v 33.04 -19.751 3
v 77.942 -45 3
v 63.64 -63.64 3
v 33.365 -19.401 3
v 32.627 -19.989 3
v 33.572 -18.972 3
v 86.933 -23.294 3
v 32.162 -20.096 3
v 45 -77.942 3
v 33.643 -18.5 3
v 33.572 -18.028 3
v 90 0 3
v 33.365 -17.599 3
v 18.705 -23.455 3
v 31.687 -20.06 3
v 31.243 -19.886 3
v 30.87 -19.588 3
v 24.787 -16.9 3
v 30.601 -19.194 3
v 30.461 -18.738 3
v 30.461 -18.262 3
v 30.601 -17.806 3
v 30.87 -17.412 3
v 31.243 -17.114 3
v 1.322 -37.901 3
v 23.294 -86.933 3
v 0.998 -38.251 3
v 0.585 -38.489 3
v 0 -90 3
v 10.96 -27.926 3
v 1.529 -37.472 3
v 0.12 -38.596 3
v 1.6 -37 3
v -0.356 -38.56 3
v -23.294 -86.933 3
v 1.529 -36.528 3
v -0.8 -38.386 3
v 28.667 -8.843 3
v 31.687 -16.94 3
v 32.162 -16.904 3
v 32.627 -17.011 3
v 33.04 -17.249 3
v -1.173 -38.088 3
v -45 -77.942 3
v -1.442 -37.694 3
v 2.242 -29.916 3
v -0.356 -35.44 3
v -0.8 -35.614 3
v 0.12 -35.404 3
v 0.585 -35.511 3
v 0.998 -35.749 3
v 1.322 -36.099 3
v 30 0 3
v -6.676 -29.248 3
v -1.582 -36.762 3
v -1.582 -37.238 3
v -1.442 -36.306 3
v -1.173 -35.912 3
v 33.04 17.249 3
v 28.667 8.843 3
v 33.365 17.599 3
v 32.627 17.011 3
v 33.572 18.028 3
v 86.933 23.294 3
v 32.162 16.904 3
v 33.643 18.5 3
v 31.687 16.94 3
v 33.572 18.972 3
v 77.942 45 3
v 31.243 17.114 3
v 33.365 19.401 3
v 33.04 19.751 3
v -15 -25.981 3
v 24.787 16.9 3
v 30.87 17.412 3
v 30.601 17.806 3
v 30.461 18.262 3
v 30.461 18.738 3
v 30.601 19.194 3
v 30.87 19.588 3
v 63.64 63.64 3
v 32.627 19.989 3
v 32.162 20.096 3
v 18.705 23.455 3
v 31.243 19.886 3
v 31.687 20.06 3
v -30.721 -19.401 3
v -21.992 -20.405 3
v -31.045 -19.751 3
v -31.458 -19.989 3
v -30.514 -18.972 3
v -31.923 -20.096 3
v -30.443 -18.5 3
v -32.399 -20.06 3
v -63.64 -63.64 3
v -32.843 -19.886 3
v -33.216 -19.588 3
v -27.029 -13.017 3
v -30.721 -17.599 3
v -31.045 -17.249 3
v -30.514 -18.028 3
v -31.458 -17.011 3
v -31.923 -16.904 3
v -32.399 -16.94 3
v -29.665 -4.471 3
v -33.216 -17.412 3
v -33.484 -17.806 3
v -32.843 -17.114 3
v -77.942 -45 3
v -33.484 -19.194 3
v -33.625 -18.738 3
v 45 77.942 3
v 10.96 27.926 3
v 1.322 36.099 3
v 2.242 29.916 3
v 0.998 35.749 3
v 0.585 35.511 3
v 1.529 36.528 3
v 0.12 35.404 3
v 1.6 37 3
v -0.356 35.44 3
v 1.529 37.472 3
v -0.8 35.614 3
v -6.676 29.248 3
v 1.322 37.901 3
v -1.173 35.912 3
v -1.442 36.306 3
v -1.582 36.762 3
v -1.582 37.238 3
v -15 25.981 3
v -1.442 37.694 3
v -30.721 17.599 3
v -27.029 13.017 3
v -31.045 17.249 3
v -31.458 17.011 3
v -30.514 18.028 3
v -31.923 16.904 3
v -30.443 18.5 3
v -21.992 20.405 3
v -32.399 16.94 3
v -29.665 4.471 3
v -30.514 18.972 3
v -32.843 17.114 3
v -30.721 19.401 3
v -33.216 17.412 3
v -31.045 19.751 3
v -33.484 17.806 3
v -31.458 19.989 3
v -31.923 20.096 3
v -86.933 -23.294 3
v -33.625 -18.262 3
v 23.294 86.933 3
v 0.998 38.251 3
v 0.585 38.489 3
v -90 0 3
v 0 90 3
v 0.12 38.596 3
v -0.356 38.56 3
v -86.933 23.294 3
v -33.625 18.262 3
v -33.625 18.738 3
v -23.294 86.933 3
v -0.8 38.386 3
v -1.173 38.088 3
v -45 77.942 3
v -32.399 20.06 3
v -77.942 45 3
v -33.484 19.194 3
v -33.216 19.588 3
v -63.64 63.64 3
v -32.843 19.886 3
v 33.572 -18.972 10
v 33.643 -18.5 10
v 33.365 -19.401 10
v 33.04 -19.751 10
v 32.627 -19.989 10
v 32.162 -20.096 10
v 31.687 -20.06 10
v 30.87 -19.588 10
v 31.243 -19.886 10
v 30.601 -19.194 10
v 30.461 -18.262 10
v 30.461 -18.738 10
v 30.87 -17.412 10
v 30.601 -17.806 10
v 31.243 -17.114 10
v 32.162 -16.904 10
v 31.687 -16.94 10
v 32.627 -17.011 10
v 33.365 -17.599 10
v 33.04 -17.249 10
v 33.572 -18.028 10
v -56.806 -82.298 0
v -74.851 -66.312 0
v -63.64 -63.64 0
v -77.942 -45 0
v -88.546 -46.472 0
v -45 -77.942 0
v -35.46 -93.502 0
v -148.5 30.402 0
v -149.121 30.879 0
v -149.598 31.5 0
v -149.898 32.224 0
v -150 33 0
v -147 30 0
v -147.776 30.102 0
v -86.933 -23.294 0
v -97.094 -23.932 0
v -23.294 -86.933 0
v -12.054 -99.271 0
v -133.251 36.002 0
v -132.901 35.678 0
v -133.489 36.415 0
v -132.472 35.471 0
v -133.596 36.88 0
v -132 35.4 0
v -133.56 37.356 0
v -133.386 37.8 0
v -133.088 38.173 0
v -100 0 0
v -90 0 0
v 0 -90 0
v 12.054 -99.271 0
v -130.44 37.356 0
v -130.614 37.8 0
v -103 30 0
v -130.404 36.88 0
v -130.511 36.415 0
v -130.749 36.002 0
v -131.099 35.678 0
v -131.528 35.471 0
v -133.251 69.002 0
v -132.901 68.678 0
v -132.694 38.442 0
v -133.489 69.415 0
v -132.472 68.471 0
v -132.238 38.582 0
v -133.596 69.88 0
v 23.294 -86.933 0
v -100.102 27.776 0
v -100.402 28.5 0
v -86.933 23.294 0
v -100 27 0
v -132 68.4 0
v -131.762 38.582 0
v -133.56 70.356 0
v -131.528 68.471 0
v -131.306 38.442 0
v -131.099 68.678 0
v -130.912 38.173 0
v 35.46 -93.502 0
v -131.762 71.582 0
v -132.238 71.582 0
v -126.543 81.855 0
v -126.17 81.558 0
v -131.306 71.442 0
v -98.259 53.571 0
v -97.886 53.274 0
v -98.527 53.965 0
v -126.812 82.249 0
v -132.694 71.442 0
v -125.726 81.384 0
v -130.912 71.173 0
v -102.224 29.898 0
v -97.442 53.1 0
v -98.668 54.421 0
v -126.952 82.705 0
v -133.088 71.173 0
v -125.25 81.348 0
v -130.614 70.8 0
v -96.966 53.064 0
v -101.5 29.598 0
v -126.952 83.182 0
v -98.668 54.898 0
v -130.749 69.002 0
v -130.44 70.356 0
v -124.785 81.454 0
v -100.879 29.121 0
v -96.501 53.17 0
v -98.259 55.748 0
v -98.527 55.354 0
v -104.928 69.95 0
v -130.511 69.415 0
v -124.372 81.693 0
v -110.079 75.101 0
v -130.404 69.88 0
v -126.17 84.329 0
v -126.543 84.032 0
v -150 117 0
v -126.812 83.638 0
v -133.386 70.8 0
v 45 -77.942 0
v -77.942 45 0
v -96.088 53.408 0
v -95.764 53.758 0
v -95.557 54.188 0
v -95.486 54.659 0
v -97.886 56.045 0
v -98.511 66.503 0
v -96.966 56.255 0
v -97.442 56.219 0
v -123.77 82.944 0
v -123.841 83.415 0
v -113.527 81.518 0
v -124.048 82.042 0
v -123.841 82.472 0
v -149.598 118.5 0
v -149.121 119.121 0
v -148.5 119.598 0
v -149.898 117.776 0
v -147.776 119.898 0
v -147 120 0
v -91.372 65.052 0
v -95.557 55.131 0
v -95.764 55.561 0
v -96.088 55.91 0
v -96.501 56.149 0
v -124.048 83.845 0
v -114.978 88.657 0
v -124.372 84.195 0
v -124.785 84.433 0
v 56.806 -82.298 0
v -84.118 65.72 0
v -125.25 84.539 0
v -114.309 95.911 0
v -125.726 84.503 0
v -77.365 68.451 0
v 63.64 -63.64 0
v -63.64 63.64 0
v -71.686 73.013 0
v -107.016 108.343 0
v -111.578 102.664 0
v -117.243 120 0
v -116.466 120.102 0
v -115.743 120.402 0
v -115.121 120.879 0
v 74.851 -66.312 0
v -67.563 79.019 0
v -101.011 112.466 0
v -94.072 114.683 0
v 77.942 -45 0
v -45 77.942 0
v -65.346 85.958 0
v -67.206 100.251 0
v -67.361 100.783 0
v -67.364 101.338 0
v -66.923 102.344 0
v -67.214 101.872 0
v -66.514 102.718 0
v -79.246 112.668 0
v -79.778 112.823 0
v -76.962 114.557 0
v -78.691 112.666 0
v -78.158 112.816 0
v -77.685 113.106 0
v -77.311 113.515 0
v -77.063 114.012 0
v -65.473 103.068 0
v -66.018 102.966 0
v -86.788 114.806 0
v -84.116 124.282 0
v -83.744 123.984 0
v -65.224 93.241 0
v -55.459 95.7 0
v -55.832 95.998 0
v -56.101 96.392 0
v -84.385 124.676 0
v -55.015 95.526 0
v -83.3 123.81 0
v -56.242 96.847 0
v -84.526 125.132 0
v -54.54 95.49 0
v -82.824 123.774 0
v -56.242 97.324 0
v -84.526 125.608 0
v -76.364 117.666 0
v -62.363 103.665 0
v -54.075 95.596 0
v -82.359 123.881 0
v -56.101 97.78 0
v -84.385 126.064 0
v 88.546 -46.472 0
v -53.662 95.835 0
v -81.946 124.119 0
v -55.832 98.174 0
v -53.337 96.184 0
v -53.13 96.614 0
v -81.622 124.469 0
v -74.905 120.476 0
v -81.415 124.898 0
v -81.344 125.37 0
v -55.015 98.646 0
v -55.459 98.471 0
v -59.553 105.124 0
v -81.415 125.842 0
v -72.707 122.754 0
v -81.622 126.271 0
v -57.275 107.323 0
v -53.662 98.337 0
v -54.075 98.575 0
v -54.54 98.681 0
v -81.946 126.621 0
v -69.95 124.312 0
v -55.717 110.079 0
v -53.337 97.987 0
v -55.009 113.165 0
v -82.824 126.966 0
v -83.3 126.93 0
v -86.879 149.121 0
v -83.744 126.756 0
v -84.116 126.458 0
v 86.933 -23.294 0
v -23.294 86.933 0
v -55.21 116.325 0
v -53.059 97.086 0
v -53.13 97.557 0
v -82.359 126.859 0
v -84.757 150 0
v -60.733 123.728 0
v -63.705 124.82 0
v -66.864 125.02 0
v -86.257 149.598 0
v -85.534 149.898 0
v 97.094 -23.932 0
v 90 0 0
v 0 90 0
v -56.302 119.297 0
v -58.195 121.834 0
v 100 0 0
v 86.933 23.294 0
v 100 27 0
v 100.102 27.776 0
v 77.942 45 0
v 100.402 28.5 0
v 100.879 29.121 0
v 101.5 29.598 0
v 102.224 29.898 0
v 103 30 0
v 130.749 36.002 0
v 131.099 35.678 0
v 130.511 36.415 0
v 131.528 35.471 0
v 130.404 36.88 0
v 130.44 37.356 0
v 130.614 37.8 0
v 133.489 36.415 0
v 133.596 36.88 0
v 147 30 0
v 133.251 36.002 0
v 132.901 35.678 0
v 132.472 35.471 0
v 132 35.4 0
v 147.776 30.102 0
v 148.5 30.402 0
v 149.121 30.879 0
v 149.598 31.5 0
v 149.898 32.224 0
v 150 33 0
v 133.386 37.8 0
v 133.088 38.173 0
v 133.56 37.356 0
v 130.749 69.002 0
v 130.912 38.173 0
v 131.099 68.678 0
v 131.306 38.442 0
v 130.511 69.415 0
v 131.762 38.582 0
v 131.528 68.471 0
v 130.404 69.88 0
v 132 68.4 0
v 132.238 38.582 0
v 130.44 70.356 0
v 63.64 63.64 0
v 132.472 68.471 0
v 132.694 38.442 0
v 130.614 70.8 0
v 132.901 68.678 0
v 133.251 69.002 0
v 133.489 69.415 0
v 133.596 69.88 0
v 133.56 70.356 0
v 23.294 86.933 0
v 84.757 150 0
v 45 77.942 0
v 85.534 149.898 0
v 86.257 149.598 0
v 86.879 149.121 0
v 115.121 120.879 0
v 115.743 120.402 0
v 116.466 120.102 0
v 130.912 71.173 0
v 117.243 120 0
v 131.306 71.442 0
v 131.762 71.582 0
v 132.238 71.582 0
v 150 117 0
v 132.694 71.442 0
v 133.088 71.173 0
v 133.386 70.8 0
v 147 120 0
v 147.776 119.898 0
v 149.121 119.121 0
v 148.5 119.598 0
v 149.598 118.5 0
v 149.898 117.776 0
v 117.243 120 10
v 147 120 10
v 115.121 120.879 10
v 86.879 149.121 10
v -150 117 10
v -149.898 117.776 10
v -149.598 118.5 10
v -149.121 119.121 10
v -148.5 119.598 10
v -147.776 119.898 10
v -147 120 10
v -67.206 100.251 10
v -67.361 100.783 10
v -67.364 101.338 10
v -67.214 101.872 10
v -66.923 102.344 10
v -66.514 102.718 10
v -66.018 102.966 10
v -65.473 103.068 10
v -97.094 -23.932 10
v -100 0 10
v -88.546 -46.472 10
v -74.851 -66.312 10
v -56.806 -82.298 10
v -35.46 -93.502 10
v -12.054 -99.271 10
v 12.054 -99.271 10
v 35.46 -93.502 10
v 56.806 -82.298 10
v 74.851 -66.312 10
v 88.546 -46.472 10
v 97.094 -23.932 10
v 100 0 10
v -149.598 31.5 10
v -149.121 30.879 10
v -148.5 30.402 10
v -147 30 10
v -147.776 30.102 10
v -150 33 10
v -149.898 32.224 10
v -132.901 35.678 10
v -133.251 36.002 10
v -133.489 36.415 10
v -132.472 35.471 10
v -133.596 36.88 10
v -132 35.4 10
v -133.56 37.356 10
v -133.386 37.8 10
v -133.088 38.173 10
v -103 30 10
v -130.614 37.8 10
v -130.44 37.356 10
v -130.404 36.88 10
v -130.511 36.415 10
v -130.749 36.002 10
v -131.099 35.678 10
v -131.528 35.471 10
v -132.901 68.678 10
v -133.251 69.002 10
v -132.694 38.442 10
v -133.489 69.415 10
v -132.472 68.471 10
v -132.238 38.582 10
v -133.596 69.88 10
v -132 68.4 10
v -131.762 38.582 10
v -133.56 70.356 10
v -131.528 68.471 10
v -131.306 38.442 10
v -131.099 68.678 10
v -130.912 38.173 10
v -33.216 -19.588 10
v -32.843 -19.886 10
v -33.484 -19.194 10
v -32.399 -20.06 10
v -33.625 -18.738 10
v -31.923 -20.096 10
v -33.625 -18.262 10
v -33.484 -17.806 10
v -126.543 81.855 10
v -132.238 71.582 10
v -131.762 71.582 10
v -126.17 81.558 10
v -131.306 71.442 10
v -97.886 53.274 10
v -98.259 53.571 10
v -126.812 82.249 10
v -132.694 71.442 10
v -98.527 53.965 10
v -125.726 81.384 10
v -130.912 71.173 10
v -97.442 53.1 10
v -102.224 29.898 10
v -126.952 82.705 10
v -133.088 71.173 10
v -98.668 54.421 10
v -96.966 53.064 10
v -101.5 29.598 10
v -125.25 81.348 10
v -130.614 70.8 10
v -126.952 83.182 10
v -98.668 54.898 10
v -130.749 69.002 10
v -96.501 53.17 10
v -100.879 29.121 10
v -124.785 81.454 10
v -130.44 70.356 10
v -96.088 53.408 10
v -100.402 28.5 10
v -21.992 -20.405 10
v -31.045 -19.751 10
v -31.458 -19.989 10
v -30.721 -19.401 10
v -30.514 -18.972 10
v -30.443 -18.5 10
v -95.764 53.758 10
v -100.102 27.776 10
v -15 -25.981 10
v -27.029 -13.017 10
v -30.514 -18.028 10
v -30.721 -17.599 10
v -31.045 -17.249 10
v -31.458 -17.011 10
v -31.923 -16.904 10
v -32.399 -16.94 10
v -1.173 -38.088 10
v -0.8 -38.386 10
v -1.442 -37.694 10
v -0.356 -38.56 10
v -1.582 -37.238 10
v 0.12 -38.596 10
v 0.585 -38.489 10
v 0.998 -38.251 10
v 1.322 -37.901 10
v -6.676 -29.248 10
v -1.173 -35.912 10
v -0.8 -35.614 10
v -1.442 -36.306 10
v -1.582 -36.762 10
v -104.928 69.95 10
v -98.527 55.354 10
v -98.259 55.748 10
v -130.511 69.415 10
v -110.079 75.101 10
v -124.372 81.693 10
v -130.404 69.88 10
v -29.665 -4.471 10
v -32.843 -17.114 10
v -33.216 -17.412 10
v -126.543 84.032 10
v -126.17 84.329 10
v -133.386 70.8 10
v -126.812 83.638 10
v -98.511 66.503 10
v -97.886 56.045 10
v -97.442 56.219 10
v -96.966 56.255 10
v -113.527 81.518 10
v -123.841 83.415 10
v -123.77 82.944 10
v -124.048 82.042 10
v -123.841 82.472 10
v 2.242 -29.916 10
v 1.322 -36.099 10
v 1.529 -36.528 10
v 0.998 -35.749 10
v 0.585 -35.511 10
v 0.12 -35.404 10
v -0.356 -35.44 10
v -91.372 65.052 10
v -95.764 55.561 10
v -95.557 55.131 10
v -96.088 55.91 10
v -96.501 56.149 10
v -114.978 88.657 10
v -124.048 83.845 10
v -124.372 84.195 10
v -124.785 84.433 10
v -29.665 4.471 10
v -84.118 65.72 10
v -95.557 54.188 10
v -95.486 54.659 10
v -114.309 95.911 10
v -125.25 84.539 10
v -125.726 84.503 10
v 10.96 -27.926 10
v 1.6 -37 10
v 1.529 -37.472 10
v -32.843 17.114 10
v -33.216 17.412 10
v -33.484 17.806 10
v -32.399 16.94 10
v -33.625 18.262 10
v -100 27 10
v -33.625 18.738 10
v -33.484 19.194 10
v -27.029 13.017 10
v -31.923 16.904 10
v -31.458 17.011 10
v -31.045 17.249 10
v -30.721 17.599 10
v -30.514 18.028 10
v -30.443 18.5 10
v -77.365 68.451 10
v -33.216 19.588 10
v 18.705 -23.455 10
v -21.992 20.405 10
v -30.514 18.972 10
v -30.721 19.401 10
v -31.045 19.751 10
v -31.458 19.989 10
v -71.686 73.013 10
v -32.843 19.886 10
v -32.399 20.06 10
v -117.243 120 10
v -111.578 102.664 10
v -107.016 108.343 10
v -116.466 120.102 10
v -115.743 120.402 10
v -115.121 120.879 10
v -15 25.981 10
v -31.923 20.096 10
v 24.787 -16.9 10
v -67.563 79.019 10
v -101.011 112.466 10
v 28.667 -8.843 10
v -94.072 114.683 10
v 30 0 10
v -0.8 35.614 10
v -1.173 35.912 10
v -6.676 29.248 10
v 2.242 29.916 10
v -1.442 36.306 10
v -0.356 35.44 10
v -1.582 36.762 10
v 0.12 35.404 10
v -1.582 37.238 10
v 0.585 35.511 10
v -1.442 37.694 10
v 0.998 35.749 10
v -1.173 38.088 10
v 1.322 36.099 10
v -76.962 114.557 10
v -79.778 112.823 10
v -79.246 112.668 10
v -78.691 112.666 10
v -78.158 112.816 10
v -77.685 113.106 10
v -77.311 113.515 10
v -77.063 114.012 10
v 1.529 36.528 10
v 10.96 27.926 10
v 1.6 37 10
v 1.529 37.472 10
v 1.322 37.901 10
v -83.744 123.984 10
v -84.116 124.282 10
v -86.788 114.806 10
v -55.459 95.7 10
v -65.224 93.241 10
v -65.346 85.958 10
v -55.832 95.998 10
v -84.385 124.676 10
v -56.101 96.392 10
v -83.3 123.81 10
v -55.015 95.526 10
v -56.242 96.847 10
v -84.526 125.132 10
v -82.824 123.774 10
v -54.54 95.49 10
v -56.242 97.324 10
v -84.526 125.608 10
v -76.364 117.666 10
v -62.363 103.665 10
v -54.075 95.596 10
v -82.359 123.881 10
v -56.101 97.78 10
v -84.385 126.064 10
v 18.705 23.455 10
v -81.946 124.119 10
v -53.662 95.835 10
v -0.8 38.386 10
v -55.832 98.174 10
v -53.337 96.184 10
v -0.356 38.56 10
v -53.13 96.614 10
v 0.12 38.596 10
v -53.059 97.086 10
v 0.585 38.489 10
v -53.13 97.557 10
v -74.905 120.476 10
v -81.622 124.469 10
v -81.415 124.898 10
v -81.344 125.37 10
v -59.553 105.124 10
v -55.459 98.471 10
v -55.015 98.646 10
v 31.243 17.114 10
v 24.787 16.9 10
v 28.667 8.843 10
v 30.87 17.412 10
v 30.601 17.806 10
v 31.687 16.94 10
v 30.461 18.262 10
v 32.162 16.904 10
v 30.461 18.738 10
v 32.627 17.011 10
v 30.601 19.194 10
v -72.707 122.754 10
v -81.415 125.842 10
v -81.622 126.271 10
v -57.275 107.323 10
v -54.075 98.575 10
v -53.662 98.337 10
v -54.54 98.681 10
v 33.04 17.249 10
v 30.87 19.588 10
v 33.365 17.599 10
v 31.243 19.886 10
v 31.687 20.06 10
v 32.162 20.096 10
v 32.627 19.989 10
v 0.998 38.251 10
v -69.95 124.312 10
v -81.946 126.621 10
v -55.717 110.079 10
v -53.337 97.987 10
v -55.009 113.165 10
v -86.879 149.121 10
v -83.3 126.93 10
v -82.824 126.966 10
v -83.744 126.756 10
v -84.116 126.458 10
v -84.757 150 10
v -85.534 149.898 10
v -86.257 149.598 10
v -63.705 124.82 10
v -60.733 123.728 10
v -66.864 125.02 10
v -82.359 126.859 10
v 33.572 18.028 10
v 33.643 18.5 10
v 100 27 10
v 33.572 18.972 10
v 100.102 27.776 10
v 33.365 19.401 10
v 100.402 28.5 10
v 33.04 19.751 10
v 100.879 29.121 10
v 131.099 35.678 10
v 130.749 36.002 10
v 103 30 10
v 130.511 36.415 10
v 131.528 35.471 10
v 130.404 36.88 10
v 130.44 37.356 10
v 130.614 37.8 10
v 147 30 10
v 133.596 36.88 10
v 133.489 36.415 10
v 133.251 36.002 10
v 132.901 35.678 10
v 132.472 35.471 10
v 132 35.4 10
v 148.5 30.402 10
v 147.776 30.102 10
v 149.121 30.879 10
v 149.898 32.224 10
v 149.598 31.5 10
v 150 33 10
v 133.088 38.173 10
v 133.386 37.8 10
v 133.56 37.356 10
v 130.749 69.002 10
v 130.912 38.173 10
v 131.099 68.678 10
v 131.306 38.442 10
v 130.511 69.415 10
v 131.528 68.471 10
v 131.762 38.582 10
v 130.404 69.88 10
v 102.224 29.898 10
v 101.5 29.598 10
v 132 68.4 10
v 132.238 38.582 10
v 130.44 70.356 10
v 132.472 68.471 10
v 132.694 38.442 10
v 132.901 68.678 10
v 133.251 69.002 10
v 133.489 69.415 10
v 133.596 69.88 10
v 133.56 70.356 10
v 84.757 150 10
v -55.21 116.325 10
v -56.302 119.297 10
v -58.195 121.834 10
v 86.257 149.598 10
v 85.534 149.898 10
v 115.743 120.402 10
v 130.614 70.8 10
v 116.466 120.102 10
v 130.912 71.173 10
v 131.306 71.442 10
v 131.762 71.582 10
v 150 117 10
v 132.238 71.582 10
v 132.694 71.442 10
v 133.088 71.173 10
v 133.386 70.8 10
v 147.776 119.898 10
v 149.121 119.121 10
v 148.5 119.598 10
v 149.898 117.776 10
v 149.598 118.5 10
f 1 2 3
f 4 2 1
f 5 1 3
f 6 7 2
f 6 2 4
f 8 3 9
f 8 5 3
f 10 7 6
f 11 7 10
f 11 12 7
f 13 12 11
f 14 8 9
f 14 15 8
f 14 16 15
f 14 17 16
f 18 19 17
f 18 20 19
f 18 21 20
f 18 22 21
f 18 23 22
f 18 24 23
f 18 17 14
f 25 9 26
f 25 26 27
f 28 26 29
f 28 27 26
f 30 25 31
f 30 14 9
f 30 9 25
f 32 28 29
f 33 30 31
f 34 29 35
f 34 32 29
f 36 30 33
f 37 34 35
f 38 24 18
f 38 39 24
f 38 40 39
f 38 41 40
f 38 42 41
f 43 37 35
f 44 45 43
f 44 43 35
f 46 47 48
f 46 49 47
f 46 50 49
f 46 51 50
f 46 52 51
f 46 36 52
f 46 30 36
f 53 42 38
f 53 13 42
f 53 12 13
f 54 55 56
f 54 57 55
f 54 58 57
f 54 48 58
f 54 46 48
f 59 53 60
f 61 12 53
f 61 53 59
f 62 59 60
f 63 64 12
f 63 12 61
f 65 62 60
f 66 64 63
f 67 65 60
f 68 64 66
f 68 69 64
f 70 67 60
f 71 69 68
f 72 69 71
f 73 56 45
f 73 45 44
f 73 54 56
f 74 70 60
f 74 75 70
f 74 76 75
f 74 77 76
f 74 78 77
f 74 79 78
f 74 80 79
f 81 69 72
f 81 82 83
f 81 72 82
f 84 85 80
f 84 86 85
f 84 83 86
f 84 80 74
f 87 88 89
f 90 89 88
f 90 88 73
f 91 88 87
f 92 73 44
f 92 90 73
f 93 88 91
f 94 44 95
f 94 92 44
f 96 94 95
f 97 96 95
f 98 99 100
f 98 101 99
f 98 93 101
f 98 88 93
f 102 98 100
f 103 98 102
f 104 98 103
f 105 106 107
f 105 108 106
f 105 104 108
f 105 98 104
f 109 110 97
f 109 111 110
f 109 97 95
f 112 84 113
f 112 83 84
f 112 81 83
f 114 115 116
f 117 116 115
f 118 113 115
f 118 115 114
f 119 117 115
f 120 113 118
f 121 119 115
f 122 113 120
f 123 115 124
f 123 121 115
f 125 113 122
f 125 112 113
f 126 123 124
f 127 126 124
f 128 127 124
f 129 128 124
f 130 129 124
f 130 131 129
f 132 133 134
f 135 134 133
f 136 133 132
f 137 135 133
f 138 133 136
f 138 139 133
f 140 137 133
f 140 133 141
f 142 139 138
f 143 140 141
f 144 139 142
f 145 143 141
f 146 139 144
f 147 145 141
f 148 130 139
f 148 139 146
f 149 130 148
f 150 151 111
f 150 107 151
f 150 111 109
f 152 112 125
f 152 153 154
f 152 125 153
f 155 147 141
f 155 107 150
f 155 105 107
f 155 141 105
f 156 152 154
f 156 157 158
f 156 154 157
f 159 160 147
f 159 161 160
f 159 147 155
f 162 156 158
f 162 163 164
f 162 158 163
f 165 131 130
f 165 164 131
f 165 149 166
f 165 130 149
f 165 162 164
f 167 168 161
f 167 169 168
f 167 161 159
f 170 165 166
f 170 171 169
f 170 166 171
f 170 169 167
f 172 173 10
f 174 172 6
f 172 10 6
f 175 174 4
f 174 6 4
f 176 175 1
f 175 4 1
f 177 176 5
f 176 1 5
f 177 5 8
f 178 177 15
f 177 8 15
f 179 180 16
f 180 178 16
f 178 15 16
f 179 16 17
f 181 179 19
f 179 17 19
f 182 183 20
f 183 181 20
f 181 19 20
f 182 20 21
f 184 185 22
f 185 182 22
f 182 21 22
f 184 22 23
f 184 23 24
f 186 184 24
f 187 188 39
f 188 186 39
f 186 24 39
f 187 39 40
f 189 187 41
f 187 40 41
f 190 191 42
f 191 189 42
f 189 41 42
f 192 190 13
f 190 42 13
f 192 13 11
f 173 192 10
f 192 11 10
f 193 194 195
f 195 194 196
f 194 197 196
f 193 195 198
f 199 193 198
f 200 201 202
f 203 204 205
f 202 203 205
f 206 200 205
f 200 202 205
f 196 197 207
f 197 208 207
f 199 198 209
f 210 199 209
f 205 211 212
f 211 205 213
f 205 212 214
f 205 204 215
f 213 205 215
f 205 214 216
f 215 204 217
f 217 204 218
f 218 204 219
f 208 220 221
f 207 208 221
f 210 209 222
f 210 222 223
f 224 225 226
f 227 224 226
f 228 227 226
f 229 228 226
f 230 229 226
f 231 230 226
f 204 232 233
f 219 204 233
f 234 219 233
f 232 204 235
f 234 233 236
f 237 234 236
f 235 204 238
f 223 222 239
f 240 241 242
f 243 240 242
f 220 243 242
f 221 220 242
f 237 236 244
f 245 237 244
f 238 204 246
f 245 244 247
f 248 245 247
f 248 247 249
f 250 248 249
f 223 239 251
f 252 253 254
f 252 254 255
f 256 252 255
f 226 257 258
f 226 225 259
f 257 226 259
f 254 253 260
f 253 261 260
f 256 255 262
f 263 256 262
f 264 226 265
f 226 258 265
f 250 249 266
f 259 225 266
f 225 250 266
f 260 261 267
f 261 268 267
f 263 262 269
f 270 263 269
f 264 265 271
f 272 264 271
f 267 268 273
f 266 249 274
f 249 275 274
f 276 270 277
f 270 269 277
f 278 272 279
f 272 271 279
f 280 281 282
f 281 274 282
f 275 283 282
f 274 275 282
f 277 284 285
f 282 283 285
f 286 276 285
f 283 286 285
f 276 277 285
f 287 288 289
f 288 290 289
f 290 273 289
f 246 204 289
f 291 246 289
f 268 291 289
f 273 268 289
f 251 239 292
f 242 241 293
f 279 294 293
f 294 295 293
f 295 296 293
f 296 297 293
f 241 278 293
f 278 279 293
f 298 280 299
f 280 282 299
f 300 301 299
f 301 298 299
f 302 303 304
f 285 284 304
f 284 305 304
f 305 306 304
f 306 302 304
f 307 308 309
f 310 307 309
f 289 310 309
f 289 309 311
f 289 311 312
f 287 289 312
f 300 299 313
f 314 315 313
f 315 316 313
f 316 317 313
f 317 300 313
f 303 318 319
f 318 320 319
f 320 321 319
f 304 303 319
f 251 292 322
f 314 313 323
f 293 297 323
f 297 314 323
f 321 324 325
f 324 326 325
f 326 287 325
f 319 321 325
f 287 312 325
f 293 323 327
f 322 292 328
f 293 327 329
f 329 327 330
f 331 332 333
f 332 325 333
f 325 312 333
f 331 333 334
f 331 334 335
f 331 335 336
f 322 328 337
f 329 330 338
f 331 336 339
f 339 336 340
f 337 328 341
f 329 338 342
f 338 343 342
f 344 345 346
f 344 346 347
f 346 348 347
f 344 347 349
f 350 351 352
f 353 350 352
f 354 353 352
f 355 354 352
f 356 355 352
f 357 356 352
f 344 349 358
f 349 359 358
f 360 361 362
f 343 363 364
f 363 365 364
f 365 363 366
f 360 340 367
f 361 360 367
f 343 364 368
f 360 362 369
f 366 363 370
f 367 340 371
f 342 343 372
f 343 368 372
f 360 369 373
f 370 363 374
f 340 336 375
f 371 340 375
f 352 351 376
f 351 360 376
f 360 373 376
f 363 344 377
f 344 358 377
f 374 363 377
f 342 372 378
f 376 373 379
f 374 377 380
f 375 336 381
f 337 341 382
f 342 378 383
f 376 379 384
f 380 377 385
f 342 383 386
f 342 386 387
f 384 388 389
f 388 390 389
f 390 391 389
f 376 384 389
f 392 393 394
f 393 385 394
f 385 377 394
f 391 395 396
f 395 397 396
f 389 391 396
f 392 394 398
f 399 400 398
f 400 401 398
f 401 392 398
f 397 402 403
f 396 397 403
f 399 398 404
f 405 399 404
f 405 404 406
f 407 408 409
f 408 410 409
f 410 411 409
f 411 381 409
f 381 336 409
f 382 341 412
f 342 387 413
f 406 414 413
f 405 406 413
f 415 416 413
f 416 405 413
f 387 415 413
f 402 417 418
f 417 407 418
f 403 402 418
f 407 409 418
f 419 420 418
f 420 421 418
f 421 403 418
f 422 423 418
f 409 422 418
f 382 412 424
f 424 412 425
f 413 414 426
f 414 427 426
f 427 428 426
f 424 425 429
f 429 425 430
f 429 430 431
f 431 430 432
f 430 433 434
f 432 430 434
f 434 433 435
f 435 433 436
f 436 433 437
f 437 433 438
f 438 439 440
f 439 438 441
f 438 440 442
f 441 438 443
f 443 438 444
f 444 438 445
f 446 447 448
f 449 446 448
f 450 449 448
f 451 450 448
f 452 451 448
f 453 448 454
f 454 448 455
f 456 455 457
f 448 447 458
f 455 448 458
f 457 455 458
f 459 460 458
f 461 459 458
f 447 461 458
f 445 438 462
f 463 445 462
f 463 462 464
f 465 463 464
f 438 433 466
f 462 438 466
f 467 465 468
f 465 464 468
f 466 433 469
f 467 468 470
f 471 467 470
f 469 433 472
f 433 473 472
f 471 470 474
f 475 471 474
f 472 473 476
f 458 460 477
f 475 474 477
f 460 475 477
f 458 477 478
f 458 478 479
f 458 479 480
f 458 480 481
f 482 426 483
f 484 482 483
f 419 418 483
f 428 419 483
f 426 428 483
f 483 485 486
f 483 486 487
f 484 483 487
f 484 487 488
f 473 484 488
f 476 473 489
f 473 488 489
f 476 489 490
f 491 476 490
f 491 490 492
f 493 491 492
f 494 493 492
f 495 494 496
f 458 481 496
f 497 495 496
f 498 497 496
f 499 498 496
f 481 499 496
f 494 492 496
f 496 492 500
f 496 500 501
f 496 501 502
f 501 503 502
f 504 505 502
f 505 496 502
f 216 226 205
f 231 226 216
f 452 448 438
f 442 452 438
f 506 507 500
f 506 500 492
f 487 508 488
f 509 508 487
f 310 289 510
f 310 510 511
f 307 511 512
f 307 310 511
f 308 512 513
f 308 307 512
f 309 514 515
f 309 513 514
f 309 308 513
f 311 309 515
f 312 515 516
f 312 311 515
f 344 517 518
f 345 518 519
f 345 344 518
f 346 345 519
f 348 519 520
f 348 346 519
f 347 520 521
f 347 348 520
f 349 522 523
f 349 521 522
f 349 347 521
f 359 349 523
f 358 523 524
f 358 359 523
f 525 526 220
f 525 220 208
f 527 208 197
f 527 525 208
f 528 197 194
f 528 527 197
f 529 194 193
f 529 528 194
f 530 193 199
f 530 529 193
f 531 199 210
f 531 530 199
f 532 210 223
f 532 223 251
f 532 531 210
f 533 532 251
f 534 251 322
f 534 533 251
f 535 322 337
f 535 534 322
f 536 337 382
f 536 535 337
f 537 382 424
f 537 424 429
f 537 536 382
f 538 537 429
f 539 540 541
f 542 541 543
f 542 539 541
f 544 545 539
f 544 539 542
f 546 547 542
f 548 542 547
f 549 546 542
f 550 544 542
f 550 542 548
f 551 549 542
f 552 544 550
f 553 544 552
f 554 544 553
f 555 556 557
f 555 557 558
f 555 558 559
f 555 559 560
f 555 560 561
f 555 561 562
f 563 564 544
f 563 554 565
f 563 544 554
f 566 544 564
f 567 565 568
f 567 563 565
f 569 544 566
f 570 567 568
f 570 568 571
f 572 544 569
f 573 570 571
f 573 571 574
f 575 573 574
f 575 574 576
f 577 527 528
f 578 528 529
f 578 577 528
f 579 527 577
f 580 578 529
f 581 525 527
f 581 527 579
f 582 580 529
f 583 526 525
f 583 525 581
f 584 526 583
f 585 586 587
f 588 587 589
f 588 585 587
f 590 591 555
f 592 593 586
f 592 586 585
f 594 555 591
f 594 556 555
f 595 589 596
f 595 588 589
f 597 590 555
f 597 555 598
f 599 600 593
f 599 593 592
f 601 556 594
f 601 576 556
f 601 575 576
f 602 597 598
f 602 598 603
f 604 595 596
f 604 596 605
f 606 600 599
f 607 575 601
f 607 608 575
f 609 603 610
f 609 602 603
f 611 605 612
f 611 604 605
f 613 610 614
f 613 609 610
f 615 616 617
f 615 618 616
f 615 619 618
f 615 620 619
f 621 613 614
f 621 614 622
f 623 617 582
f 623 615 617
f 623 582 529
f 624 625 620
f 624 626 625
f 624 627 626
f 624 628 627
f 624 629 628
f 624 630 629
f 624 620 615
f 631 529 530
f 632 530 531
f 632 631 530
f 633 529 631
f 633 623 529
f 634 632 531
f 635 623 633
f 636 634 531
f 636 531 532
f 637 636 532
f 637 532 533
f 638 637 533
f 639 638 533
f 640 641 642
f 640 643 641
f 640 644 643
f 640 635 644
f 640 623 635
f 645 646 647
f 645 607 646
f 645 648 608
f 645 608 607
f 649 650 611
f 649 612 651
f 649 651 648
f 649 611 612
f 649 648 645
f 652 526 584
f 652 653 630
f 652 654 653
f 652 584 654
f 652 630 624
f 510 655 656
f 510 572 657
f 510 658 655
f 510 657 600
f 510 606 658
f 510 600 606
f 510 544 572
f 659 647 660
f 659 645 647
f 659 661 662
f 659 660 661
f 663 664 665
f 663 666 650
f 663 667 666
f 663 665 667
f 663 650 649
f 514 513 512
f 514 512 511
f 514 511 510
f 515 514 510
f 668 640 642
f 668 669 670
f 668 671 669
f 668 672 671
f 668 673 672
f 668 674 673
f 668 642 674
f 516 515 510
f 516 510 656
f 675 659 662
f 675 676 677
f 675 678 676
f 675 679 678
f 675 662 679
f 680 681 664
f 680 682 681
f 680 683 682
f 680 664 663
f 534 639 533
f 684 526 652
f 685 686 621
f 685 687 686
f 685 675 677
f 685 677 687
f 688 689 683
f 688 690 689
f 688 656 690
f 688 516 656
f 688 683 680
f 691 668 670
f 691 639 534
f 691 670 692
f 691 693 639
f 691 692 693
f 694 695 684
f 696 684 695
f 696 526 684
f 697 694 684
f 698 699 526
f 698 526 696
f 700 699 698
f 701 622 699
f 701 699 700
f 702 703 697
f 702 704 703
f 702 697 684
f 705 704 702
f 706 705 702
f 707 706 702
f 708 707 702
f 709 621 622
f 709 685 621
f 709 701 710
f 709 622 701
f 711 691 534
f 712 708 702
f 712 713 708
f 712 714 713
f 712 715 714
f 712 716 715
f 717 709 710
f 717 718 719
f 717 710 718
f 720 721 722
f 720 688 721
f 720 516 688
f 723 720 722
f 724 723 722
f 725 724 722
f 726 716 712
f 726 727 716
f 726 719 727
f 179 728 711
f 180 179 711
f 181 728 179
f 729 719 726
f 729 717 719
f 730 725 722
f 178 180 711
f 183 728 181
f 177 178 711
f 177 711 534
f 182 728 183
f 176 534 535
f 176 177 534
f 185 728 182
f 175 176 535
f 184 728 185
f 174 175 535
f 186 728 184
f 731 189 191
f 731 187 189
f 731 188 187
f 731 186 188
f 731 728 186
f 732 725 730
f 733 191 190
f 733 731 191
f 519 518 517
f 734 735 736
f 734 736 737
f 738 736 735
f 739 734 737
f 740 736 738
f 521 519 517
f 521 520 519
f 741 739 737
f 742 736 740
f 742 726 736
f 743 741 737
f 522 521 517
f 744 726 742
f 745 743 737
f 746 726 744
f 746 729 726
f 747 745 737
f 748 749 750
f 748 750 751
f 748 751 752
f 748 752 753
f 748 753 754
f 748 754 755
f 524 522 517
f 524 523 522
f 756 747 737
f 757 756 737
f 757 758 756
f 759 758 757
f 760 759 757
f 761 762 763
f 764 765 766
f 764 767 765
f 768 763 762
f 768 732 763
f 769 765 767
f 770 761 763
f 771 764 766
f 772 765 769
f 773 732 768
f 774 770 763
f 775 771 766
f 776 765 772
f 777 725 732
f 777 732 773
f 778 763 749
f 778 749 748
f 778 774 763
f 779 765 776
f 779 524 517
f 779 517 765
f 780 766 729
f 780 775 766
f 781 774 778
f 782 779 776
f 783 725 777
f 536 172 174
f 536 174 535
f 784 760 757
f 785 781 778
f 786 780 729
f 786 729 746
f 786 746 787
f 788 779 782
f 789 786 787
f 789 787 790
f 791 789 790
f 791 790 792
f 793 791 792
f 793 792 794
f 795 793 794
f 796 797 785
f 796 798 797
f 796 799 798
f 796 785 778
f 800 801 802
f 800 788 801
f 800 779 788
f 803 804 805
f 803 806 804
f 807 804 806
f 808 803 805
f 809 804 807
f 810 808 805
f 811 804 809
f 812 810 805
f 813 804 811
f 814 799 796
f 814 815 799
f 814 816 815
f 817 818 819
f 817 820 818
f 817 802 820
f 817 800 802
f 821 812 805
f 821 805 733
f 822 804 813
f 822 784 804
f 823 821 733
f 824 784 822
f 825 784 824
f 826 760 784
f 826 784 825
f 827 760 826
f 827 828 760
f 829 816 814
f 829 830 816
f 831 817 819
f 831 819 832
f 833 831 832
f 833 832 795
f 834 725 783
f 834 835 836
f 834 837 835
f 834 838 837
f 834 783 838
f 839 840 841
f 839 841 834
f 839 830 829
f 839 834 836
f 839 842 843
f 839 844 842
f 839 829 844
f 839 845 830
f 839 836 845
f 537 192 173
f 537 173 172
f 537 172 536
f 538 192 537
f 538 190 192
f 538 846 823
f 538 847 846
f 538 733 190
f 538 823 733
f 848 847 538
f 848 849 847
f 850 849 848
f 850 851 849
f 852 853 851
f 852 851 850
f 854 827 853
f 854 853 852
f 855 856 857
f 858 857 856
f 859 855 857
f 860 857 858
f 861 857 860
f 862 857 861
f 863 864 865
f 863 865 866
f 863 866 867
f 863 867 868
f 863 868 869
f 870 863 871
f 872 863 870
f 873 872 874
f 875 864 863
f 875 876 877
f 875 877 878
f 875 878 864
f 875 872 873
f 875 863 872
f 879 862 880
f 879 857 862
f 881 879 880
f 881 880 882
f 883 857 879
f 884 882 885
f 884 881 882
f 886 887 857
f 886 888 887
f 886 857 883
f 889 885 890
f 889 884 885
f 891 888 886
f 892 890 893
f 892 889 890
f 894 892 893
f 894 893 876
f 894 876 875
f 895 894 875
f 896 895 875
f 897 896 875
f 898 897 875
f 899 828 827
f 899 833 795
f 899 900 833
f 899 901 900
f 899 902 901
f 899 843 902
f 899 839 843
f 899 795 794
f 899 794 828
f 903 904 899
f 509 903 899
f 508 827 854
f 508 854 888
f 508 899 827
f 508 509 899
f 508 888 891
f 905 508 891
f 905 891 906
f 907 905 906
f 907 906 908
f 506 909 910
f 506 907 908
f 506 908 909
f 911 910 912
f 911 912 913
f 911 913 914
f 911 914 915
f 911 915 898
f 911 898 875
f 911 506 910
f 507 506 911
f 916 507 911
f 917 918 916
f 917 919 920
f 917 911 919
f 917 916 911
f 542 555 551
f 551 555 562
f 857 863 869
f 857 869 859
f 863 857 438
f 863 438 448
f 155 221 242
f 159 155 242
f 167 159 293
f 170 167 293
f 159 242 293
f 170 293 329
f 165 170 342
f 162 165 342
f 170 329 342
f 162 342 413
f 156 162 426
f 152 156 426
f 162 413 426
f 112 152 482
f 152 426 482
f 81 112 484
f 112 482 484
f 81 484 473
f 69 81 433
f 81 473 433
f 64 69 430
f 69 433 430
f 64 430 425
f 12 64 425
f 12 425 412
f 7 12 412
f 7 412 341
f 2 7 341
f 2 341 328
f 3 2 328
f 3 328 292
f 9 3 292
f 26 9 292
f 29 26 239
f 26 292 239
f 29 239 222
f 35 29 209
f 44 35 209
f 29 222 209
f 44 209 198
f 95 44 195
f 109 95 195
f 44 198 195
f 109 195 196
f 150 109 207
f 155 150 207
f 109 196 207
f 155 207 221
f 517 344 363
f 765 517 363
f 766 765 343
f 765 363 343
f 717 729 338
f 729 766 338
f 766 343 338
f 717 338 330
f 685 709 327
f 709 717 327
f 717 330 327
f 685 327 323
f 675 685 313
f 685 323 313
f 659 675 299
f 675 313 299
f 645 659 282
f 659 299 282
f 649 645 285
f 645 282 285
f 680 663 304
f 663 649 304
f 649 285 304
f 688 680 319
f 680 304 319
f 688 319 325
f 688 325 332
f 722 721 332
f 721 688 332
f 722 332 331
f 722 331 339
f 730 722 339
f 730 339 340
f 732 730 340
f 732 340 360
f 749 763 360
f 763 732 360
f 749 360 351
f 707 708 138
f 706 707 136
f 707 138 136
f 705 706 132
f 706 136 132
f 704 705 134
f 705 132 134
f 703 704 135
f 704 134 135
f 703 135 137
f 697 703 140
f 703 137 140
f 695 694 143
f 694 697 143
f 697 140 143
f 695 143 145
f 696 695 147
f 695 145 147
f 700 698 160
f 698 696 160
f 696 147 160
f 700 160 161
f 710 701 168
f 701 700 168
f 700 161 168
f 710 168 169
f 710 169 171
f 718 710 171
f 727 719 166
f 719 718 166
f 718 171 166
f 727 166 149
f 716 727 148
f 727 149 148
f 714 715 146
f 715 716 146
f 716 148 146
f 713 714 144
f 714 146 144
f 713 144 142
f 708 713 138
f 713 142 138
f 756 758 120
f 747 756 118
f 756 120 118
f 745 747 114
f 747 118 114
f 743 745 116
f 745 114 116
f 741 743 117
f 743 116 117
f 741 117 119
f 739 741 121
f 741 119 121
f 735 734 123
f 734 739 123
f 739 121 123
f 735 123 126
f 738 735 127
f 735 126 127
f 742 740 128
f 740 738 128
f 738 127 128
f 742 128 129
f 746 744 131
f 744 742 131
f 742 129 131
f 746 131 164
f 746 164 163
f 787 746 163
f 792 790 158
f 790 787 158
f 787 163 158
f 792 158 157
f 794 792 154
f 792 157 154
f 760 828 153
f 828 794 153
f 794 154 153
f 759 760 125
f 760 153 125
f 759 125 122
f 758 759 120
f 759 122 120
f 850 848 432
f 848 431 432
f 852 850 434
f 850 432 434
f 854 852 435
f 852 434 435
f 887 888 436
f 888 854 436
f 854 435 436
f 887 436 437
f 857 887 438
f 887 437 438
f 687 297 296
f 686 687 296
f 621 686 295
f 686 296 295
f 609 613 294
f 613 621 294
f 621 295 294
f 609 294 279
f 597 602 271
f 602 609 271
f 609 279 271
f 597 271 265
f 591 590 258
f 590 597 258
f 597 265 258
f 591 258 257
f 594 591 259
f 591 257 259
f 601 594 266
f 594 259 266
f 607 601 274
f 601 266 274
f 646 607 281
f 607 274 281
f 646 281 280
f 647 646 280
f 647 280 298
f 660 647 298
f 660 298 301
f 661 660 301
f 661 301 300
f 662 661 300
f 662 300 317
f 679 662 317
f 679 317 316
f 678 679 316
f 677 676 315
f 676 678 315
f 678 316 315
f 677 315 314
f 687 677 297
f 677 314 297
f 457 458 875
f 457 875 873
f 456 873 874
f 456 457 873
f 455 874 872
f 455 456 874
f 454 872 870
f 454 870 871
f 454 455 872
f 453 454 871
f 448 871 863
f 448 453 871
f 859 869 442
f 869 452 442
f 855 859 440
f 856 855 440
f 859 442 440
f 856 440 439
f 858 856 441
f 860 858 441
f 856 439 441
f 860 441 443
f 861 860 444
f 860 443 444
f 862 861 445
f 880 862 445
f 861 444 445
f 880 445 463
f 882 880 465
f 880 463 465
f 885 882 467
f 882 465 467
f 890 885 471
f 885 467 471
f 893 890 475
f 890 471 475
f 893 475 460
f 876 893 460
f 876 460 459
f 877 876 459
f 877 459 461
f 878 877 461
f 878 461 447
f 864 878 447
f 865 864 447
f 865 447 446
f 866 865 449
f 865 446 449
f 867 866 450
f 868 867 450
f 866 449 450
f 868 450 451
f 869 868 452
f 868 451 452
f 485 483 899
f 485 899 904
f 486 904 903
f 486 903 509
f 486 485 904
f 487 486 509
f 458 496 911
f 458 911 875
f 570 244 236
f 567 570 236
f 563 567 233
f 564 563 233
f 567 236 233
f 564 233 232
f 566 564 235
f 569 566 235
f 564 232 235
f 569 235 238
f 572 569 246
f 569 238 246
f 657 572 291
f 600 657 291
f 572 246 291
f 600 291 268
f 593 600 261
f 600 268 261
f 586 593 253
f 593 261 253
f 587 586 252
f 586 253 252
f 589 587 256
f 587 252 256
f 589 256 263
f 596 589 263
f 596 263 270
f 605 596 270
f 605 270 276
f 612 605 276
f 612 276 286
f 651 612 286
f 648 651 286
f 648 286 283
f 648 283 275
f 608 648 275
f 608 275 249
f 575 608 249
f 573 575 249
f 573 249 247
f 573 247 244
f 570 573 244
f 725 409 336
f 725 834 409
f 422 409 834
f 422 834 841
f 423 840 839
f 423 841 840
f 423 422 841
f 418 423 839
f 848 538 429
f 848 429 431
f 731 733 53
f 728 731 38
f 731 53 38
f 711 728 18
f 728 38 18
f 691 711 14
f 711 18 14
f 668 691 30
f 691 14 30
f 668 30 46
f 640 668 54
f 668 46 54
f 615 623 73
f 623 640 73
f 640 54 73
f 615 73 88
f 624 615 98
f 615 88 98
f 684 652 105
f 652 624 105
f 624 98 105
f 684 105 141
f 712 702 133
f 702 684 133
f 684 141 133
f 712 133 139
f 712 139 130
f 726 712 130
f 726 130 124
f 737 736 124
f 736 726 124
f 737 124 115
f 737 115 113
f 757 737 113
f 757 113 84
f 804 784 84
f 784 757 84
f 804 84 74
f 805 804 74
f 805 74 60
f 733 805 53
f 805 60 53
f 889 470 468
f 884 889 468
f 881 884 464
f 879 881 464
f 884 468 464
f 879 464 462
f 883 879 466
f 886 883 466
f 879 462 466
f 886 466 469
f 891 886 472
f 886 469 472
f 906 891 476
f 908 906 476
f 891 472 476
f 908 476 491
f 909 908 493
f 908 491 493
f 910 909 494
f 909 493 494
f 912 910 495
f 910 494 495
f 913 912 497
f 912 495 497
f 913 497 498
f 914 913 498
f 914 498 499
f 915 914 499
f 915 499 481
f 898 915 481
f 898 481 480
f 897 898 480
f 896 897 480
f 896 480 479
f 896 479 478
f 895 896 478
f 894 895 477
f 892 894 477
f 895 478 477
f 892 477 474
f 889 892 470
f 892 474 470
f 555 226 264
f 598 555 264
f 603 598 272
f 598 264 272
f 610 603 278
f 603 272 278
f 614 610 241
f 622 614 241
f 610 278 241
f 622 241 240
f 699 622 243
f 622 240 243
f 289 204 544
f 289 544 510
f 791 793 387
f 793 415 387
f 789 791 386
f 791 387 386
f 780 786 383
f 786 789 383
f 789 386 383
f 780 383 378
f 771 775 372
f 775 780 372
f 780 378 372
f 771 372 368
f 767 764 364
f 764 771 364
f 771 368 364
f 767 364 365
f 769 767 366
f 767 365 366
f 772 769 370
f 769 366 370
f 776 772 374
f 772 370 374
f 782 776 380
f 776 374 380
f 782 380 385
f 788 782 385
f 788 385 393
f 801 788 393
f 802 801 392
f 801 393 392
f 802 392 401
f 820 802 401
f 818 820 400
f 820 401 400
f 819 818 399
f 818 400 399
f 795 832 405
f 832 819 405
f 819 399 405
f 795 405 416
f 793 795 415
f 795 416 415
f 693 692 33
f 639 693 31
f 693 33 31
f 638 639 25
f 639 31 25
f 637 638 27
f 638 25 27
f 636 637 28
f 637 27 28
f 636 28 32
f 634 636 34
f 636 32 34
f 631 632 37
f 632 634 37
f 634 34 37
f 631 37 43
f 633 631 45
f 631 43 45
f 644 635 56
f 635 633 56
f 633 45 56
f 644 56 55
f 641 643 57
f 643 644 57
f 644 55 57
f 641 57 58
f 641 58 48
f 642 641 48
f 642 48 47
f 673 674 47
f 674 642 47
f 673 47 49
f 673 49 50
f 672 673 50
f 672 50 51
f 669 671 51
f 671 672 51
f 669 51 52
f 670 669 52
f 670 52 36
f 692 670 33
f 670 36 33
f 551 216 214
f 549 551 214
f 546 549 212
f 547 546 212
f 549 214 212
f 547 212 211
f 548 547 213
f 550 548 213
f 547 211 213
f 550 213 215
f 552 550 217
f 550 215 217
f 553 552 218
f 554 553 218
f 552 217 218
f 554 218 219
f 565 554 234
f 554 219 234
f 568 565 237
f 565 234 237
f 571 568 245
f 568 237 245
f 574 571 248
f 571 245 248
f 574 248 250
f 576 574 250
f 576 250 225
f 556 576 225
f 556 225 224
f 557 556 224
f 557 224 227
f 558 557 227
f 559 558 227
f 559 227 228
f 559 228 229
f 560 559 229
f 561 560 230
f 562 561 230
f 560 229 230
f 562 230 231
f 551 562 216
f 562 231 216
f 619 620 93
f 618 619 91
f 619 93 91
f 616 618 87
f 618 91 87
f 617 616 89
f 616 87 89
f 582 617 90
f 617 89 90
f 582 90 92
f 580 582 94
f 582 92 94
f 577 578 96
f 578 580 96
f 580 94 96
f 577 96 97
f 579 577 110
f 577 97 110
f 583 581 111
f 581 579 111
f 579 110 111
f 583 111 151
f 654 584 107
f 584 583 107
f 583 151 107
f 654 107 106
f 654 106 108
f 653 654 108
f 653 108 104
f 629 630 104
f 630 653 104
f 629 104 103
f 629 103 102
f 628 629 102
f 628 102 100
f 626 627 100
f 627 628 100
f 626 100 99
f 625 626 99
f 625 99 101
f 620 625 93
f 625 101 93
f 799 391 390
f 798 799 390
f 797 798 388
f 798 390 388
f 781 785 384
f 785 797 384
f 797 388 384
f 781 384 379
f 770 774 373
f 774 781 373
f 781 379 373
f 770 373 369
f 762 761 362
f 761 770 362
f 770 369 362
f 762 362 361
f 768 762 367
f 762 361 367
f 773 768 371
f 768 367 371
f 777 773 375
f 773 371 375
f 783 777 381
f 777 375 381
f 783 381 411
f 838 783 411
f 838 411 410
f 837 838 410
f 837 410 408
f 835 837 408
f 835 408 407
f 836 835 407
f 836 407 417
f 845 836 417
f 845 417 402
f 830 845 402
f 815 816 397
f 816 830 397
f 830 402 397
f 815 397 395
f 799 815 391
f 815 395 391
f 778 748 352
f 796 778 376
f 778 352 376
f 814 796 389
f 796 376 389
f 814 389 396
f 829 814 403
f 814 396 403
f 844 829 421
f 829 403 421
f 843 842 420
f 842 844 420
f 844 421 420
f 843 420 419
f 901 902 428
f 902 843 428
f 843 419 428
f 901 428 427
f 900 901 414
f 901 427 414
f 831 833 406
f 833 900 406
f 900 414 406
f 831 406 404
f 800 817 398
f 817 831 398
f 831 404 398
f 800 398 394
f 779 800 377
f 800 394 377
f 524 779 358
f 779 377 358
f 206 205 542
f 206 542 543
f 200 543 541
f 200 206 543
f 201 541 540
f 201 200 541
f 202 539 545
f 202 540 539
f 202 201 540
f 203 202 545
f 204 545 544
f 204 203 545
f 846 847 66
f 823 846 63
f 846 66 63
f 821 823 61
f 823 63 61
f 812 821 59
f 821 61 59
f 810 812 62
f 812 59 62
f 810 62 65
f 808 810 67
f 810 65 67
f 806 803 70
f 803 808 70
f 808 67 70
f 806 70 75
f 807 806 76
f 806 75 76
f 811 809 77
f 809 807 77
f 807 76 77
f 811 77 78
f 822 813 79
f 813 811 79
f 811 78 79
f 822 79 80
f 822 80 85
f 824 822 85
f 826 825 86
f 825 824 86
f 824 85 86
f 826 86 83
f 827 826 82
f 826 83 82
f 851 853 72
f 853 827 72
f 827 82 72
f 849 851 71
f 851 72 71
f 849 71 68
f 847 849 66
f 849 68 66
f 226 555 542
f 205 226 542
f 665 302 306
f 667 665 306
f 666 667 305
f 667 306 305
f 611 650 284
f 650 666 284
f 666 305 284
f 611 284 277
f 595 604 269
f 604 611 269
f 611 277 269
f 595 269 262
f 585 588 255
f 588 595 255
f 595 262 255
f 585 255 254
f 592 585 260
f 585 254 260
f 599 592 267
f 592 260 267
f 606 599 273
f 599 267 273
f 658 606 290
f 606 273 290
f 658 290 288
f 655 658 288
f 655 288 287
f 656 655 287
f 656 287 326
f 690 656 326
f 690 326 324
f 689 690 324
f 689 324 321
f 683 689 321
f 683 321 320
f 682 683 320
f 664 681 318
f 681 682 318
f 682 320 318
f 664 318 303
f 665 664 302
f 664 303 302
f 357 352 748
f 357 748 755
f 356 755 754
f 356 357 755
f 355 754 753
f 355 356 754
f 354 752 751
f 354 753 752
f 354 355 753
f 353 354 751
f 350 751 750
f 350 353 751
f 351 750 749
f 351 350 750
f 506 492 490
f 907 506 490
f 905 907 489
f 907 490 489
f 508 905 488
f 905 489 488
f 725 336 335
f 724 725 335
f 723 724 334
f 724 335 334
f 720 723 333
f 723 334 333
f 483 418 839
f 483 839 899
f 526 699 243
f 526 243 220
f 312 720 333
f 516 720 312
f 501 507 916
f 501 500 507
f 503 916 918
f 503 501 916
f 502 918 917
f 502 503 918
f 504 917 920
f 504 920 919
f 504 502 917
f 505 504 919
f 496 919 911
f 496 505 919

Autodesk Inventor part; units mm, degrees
ref_plane "YZ Plane" through (0, 0, 0) normal (1, 0, 0) x (0, 1, 0)
ref_plane "XZ Plane" through (0, 0, 0) normal (0, 1, 0) x (-1, 0, 0)
ref_plane "XY Plane" through (0, 0, 0) normal (0, 0, 1) x (1, 0, 0)
sketch "スケッチ1" plane through (-150, -150, 0) normal (0, 0, 1) x (1, 0, 0)
  circle A0 centre (59.9853, 240.0147) radius 24 construction
  circle A1 centre (59.9853, 240.0147) radius 24 construction
  circle A2 centre (84.0269, 264.0563) radius 10 construction
  line L0 (84.0269, 264.0563) -> (59.9853, 240.0147) construction
  line L1 (59.9853, 240.0147) -> (84.0269, 215.9731) construction
  arc A3 (84.5273, 253.0677) -> (73.0383, 264.5567) centre (84.0269, 264.0563) ccw
  arc A4 (70.2215, 262.823) -> (82.7936, 250.2509) centre (59.9853, 240.0147) ccw
  arc A5 (84.5273, 253.0677) -> (82.7936, 250.2509) centre (84.6183, 251.0698) ccw
  arc A6 (70.2215, 262.823) -> (73.0383, 264.5567) centre (71.0404, 264.6477) ccw
  line L2 (67.0564, 275.37) -> (24.63, 232.9436) construction
  line L3 (24.63, 232.9436) -> (52.9142, 204.6594) construction
  line L4 (52.9142, 204.6594) -> (95.3406, 247.0858) construction
  line L5 (95.3406, 247.0858) -> (67.0564, 275.37) construction
  line L6 (67.0564, 275.37) -> (52.9142, 204.6594) construction
  line L7 (24.63, 232.9436) -> (95.3406, 247.0858) construction
  circle A7 centre (95.3406, 247.0858) radius 1.6
  circle A8 centre (52.9142, 204.6594) radius 1.6
  circle A9 centre (24.63, 232.9436) radius 1.6
  circle A10 centre (67.0564, 275.37) radius 1.6
  line L8 (270, 30) -> (30, 30) construction
  line L9 (30, 30) -> (30, 270) construction
  line L10 (30, 270) -> (270, 270) construction
  line L11 (270, 270) -> (270, 30) construction
  line L12 (270, 30) -> (30, 270) construction
  line L13 (30, 30) -> (270, 270) construction
  circle A11 centre (30, 270) radius 2 construction
  circle A12 centre (270, 270) radius 2 construction
  circle A13 centre (30, 30) radius 2
  circle A14 centre (270, 30) radius 2
  circle A15 centre (150, 150) radius 30
  line L14 (150, 113) -> (117.9571, 131.5) construction
  line L15 (117.9571, 131.5) -> (117.9571, 168.5) construction
  line L16 (117.9571, 168.5) -> (150, 187) construction
  line L17 (150, 187) -> (182.0429, 168.5) construction
  line L18 (182.0429, 168.5) -> (182.0429, 131.5) construction
  line L19 (182.0429, 131.5) -> (150, 113) construction
  circle A16 centre (150, 150) radius 37 construction
  circle A17 centre (150, 113) radius 1.6
  circle A18 centre (54.1207, 93.2509) radius 1.6 construction
  line L20 (117.9571, 131.5) -> (117.9571, 168.5) construction
  line L21 (150, 113) -> (117.9571, 131.5) construction
  line L22 (117.9571, 168.5) -> (150, 187) construction
  line L23 (182.0429, 131.5) -> (150, 113) construction
  circle A19 centre (150, 150) radius 30 construction
  line L24 (150, 187) -> (182.0429, 168.5) construction
  line L25 (182.0429, 168.5) -> (182.0429, 131.5) construction
  circle A20 centre (150, 150) radius 37 construction
  circle A21 centre (182.0429, 131.5) radius 1.6
  circle A22 centre (151.2065, 38.5916) radius 1.6 construction
  line L26 (150, 113) -> (117.9571, 131.5) construction
  line L27 (182.0429, 131.5) -> (150, 113) construction
  line L28 (117.9571, 131.5) -> (117.9571, 168.5) construction
  line L29 (182.0429, 168.5) -> (182.0429, 131.5) construction
  circle A23 centre (150, 150) radius 30 construction
  line L30 (117.9571, 168.5) -> (150, 187) construction
  line L31 (150, 187) -> (182.0429, 168.5) construction
  circle A24 centre (150, 150) radius 37 construction
  circle A25 centre (182.0429, 168.5) radius 1.6
  circle A26 centre (247.0858, 95.3406) radius 1.6 construction
  line L32 (182.0429, 131.5) -> (150, 113) construction
  line L33 (182.0429, 168.5) -> (182.0429, 131.5) construction
  line L34 (150, 113) -> (117.9571, 131.5) construction
  line L35 (150, 187) -> (182.0429, 168.5) construction
  circle A27 centre (150, 150) radius 30 construction
  line L36 (117.9571, 131.5) -> (117.9571, 168.5) construction
  line L37 (117.9571, 168.5) -> (150, 187) construction
  circle A28 centre (150, 150) radius 37 construction
  circle A29 centre (150, 187) radius 1.6
  circle A30 centre (245.8793, 206.7491) radius 1.6 construction
  line L38 (182.0429, 168.5) -> (182.0429, 131.5) construction
  line L39 (150, 187) -> (182.0429, 168.5) construction
  line L40 (182.0429, 131.5) -> (150, 113) construction
  line L41 (117.9571, 168.5) -> (150, 187) construction
  circle A31 centre (150, 150) radius 30 construction
  line L42 (150, 113) -> (117.9571, 131.5) construction
  line L43 (117.9571, 131.5) -> (117.9571, 168.5) construction
  circle A32 centre (150, 150) radius 37 construction
  circle A33 centre (117.9571, 168.5) radius 1.6
  circle A34 centre (148.7935, 261.4084) radius 1.6 construction
  line L44 (150, 187) -> (182.0429, 168.5) construction
  line L45 (117.9571, 168.5) -> (150, 187) construction
  line L46 (182.0429, 168.5) -> (182.0429, 131.5) construction
  line L47 (117.9571, 131.5) -> (117.9571, 168.5) construction
  circle A35 centre (150, 150) radius 30 construction
  line L48 (182.0429, 131.5) -> (150, 113) construction
  line L49 (150, 113) -> (117.9571, 131.5) construction
  circle A36 centre (150, 150) radius 37 construction
  circle A37 centre (117.9571, 131.5) radius 1.6
  line L50 (0, 300) -> (300, 300)
  line L51 (300, 300) -> (300, 0)
  line L52 (300, 0) -> (0, 0)
  line L53 (0, 0) -> (0, 300)
  line L54 (0, 300) -> (300, 0) construction
  line L55 (300, 300) -> (0, 0) construction
  point P0 (150, 150)
  point P1 (81.1985, 261.2279)
  point P2 (150, 150)
  point P3 (59.8791, 125.8522)
  point P4 (150, 150)
  point P5 (125.8522, 59.8791)
  point P6 (150, 150)
  point P7 (215.9731, 84.0269)
  point P8 (150, 150)
  point P9 (240.1209, 174.1478)
  point P10 (150, 150)
  point P11 (174.1478, 240.1209)
  dimension "d30" = 74
  dimension "d6" = 48
  dimension "d7" = 20
  dimension "d10" = 25
  dimension "d11" = 11
  dimension "d12" = 2
  dimension "d15" = 40
  dimension "d16" = 60
  dimension "d17" = 3.2
  dimension "d18" = 240
  dimension "d19" = 4
  dimension "d22" = 240
  dimension "d25" = 240
  dimension "d28" = 60
  dimension "d31" = 3.2
  dimension "d34" = 360
  dimension "d36" = 300
  dimension "d39" = 127.3
  dimension "d40" = 3.2
  dimension "d41" = 48
extrude "押し出し2" add sketch "スケッチ1" along normal blind 10
sketch "スケッチ2" plane through (-150, -150, 0) normal (0, 0, -1) x (-1, 0, 0)
  circle A0 centre (-150, 150) radius 90
  dimension "d42" = 180
extrude "押し出し3" cut sketch "スケッチ2" against normal blind 3
sketch "スケッチ3" plane through (-150, -150, 10) normal (0, 0, 1) x (1, 0, 0)
  line L0 (300, 300) -> (0, 300) projected
  line L1 (0, 300) -> (0, 0) projected
  line L2 (0, 0) -> (300, 0) projected
  line L3 (300, 0) -> (300, 300) projected
  circle A0 centre (150, 150) radius 30 projected
  line L4 (150, 180) -> (150, 150) construction
  line L5 (50, 180) -> (50, 150)
  line L6 (250, 150) -> (250, 180)
  arc A1 (250, 180) -> (50, 180) centre (150, 180) ccw
  arc A2 (50, 150) -> (250, 150) centre (150, 150) ccw
  line L7 (50, 180) -> (0, 180)
  line L8 (250, 180) -> (300, 180)
  line L9 (300, 40) -> (0, 40)
  line L10 (64, 300) -> (34, 270)
  line L11 (266, 270) -> (236, 300)
  line L12 (300, 270) -> (266, 270)
  line L13 (34, 270) -> (0, 270)
  point P0 (150, 165)
  dimension "d45" = 100
  dimension "d46" = 30
  dimension "d51" = 40
  dimension "d52" = 45
  dimension "d53" = 64
  dimension "d55" = 30
extrude "押し出し5" cut sketch "スケッチ3" against normal blind 10 contours L3 L12 L11 L0 | L10 L13 L1 L0 | L3 L9 L1 L7 L5 A2 L6 L8 | L3 L2 L1 L9
sketch "スケッチ5" plane through (-150, -150, 10) normal (0, 0, 1) x (1, 0, 0)
  circle A0 centre (18, 187) radius 1.6 projected
  circle A1 centre (282, 187) radius 1.6 projected
  point P0 (150, 150)
  point P1 (18, 220)
  point P2 (282, 220)
  dimension "d65" = 33
  dimension "d66" = 33
hole "穴1" at (-132, 37, 10) at (132, 37, 10) at (132, 70, 10) at (-132, 70, 10) direction (0, 0, -1) diameter 3.2 end through all
fillet "フィレット1" radius 3 10 edges at (-86, 150, 5) (-116, 120, 5) (-150, 120, 5) (-150, 30, 5) (-100, 30, 5) (100, 30, 5) (150, 30, 5) (150, 120, 5) (116, 120, 5) (86, 150, 5)
properties part number "ロボットベース2019" material "マツ材"
